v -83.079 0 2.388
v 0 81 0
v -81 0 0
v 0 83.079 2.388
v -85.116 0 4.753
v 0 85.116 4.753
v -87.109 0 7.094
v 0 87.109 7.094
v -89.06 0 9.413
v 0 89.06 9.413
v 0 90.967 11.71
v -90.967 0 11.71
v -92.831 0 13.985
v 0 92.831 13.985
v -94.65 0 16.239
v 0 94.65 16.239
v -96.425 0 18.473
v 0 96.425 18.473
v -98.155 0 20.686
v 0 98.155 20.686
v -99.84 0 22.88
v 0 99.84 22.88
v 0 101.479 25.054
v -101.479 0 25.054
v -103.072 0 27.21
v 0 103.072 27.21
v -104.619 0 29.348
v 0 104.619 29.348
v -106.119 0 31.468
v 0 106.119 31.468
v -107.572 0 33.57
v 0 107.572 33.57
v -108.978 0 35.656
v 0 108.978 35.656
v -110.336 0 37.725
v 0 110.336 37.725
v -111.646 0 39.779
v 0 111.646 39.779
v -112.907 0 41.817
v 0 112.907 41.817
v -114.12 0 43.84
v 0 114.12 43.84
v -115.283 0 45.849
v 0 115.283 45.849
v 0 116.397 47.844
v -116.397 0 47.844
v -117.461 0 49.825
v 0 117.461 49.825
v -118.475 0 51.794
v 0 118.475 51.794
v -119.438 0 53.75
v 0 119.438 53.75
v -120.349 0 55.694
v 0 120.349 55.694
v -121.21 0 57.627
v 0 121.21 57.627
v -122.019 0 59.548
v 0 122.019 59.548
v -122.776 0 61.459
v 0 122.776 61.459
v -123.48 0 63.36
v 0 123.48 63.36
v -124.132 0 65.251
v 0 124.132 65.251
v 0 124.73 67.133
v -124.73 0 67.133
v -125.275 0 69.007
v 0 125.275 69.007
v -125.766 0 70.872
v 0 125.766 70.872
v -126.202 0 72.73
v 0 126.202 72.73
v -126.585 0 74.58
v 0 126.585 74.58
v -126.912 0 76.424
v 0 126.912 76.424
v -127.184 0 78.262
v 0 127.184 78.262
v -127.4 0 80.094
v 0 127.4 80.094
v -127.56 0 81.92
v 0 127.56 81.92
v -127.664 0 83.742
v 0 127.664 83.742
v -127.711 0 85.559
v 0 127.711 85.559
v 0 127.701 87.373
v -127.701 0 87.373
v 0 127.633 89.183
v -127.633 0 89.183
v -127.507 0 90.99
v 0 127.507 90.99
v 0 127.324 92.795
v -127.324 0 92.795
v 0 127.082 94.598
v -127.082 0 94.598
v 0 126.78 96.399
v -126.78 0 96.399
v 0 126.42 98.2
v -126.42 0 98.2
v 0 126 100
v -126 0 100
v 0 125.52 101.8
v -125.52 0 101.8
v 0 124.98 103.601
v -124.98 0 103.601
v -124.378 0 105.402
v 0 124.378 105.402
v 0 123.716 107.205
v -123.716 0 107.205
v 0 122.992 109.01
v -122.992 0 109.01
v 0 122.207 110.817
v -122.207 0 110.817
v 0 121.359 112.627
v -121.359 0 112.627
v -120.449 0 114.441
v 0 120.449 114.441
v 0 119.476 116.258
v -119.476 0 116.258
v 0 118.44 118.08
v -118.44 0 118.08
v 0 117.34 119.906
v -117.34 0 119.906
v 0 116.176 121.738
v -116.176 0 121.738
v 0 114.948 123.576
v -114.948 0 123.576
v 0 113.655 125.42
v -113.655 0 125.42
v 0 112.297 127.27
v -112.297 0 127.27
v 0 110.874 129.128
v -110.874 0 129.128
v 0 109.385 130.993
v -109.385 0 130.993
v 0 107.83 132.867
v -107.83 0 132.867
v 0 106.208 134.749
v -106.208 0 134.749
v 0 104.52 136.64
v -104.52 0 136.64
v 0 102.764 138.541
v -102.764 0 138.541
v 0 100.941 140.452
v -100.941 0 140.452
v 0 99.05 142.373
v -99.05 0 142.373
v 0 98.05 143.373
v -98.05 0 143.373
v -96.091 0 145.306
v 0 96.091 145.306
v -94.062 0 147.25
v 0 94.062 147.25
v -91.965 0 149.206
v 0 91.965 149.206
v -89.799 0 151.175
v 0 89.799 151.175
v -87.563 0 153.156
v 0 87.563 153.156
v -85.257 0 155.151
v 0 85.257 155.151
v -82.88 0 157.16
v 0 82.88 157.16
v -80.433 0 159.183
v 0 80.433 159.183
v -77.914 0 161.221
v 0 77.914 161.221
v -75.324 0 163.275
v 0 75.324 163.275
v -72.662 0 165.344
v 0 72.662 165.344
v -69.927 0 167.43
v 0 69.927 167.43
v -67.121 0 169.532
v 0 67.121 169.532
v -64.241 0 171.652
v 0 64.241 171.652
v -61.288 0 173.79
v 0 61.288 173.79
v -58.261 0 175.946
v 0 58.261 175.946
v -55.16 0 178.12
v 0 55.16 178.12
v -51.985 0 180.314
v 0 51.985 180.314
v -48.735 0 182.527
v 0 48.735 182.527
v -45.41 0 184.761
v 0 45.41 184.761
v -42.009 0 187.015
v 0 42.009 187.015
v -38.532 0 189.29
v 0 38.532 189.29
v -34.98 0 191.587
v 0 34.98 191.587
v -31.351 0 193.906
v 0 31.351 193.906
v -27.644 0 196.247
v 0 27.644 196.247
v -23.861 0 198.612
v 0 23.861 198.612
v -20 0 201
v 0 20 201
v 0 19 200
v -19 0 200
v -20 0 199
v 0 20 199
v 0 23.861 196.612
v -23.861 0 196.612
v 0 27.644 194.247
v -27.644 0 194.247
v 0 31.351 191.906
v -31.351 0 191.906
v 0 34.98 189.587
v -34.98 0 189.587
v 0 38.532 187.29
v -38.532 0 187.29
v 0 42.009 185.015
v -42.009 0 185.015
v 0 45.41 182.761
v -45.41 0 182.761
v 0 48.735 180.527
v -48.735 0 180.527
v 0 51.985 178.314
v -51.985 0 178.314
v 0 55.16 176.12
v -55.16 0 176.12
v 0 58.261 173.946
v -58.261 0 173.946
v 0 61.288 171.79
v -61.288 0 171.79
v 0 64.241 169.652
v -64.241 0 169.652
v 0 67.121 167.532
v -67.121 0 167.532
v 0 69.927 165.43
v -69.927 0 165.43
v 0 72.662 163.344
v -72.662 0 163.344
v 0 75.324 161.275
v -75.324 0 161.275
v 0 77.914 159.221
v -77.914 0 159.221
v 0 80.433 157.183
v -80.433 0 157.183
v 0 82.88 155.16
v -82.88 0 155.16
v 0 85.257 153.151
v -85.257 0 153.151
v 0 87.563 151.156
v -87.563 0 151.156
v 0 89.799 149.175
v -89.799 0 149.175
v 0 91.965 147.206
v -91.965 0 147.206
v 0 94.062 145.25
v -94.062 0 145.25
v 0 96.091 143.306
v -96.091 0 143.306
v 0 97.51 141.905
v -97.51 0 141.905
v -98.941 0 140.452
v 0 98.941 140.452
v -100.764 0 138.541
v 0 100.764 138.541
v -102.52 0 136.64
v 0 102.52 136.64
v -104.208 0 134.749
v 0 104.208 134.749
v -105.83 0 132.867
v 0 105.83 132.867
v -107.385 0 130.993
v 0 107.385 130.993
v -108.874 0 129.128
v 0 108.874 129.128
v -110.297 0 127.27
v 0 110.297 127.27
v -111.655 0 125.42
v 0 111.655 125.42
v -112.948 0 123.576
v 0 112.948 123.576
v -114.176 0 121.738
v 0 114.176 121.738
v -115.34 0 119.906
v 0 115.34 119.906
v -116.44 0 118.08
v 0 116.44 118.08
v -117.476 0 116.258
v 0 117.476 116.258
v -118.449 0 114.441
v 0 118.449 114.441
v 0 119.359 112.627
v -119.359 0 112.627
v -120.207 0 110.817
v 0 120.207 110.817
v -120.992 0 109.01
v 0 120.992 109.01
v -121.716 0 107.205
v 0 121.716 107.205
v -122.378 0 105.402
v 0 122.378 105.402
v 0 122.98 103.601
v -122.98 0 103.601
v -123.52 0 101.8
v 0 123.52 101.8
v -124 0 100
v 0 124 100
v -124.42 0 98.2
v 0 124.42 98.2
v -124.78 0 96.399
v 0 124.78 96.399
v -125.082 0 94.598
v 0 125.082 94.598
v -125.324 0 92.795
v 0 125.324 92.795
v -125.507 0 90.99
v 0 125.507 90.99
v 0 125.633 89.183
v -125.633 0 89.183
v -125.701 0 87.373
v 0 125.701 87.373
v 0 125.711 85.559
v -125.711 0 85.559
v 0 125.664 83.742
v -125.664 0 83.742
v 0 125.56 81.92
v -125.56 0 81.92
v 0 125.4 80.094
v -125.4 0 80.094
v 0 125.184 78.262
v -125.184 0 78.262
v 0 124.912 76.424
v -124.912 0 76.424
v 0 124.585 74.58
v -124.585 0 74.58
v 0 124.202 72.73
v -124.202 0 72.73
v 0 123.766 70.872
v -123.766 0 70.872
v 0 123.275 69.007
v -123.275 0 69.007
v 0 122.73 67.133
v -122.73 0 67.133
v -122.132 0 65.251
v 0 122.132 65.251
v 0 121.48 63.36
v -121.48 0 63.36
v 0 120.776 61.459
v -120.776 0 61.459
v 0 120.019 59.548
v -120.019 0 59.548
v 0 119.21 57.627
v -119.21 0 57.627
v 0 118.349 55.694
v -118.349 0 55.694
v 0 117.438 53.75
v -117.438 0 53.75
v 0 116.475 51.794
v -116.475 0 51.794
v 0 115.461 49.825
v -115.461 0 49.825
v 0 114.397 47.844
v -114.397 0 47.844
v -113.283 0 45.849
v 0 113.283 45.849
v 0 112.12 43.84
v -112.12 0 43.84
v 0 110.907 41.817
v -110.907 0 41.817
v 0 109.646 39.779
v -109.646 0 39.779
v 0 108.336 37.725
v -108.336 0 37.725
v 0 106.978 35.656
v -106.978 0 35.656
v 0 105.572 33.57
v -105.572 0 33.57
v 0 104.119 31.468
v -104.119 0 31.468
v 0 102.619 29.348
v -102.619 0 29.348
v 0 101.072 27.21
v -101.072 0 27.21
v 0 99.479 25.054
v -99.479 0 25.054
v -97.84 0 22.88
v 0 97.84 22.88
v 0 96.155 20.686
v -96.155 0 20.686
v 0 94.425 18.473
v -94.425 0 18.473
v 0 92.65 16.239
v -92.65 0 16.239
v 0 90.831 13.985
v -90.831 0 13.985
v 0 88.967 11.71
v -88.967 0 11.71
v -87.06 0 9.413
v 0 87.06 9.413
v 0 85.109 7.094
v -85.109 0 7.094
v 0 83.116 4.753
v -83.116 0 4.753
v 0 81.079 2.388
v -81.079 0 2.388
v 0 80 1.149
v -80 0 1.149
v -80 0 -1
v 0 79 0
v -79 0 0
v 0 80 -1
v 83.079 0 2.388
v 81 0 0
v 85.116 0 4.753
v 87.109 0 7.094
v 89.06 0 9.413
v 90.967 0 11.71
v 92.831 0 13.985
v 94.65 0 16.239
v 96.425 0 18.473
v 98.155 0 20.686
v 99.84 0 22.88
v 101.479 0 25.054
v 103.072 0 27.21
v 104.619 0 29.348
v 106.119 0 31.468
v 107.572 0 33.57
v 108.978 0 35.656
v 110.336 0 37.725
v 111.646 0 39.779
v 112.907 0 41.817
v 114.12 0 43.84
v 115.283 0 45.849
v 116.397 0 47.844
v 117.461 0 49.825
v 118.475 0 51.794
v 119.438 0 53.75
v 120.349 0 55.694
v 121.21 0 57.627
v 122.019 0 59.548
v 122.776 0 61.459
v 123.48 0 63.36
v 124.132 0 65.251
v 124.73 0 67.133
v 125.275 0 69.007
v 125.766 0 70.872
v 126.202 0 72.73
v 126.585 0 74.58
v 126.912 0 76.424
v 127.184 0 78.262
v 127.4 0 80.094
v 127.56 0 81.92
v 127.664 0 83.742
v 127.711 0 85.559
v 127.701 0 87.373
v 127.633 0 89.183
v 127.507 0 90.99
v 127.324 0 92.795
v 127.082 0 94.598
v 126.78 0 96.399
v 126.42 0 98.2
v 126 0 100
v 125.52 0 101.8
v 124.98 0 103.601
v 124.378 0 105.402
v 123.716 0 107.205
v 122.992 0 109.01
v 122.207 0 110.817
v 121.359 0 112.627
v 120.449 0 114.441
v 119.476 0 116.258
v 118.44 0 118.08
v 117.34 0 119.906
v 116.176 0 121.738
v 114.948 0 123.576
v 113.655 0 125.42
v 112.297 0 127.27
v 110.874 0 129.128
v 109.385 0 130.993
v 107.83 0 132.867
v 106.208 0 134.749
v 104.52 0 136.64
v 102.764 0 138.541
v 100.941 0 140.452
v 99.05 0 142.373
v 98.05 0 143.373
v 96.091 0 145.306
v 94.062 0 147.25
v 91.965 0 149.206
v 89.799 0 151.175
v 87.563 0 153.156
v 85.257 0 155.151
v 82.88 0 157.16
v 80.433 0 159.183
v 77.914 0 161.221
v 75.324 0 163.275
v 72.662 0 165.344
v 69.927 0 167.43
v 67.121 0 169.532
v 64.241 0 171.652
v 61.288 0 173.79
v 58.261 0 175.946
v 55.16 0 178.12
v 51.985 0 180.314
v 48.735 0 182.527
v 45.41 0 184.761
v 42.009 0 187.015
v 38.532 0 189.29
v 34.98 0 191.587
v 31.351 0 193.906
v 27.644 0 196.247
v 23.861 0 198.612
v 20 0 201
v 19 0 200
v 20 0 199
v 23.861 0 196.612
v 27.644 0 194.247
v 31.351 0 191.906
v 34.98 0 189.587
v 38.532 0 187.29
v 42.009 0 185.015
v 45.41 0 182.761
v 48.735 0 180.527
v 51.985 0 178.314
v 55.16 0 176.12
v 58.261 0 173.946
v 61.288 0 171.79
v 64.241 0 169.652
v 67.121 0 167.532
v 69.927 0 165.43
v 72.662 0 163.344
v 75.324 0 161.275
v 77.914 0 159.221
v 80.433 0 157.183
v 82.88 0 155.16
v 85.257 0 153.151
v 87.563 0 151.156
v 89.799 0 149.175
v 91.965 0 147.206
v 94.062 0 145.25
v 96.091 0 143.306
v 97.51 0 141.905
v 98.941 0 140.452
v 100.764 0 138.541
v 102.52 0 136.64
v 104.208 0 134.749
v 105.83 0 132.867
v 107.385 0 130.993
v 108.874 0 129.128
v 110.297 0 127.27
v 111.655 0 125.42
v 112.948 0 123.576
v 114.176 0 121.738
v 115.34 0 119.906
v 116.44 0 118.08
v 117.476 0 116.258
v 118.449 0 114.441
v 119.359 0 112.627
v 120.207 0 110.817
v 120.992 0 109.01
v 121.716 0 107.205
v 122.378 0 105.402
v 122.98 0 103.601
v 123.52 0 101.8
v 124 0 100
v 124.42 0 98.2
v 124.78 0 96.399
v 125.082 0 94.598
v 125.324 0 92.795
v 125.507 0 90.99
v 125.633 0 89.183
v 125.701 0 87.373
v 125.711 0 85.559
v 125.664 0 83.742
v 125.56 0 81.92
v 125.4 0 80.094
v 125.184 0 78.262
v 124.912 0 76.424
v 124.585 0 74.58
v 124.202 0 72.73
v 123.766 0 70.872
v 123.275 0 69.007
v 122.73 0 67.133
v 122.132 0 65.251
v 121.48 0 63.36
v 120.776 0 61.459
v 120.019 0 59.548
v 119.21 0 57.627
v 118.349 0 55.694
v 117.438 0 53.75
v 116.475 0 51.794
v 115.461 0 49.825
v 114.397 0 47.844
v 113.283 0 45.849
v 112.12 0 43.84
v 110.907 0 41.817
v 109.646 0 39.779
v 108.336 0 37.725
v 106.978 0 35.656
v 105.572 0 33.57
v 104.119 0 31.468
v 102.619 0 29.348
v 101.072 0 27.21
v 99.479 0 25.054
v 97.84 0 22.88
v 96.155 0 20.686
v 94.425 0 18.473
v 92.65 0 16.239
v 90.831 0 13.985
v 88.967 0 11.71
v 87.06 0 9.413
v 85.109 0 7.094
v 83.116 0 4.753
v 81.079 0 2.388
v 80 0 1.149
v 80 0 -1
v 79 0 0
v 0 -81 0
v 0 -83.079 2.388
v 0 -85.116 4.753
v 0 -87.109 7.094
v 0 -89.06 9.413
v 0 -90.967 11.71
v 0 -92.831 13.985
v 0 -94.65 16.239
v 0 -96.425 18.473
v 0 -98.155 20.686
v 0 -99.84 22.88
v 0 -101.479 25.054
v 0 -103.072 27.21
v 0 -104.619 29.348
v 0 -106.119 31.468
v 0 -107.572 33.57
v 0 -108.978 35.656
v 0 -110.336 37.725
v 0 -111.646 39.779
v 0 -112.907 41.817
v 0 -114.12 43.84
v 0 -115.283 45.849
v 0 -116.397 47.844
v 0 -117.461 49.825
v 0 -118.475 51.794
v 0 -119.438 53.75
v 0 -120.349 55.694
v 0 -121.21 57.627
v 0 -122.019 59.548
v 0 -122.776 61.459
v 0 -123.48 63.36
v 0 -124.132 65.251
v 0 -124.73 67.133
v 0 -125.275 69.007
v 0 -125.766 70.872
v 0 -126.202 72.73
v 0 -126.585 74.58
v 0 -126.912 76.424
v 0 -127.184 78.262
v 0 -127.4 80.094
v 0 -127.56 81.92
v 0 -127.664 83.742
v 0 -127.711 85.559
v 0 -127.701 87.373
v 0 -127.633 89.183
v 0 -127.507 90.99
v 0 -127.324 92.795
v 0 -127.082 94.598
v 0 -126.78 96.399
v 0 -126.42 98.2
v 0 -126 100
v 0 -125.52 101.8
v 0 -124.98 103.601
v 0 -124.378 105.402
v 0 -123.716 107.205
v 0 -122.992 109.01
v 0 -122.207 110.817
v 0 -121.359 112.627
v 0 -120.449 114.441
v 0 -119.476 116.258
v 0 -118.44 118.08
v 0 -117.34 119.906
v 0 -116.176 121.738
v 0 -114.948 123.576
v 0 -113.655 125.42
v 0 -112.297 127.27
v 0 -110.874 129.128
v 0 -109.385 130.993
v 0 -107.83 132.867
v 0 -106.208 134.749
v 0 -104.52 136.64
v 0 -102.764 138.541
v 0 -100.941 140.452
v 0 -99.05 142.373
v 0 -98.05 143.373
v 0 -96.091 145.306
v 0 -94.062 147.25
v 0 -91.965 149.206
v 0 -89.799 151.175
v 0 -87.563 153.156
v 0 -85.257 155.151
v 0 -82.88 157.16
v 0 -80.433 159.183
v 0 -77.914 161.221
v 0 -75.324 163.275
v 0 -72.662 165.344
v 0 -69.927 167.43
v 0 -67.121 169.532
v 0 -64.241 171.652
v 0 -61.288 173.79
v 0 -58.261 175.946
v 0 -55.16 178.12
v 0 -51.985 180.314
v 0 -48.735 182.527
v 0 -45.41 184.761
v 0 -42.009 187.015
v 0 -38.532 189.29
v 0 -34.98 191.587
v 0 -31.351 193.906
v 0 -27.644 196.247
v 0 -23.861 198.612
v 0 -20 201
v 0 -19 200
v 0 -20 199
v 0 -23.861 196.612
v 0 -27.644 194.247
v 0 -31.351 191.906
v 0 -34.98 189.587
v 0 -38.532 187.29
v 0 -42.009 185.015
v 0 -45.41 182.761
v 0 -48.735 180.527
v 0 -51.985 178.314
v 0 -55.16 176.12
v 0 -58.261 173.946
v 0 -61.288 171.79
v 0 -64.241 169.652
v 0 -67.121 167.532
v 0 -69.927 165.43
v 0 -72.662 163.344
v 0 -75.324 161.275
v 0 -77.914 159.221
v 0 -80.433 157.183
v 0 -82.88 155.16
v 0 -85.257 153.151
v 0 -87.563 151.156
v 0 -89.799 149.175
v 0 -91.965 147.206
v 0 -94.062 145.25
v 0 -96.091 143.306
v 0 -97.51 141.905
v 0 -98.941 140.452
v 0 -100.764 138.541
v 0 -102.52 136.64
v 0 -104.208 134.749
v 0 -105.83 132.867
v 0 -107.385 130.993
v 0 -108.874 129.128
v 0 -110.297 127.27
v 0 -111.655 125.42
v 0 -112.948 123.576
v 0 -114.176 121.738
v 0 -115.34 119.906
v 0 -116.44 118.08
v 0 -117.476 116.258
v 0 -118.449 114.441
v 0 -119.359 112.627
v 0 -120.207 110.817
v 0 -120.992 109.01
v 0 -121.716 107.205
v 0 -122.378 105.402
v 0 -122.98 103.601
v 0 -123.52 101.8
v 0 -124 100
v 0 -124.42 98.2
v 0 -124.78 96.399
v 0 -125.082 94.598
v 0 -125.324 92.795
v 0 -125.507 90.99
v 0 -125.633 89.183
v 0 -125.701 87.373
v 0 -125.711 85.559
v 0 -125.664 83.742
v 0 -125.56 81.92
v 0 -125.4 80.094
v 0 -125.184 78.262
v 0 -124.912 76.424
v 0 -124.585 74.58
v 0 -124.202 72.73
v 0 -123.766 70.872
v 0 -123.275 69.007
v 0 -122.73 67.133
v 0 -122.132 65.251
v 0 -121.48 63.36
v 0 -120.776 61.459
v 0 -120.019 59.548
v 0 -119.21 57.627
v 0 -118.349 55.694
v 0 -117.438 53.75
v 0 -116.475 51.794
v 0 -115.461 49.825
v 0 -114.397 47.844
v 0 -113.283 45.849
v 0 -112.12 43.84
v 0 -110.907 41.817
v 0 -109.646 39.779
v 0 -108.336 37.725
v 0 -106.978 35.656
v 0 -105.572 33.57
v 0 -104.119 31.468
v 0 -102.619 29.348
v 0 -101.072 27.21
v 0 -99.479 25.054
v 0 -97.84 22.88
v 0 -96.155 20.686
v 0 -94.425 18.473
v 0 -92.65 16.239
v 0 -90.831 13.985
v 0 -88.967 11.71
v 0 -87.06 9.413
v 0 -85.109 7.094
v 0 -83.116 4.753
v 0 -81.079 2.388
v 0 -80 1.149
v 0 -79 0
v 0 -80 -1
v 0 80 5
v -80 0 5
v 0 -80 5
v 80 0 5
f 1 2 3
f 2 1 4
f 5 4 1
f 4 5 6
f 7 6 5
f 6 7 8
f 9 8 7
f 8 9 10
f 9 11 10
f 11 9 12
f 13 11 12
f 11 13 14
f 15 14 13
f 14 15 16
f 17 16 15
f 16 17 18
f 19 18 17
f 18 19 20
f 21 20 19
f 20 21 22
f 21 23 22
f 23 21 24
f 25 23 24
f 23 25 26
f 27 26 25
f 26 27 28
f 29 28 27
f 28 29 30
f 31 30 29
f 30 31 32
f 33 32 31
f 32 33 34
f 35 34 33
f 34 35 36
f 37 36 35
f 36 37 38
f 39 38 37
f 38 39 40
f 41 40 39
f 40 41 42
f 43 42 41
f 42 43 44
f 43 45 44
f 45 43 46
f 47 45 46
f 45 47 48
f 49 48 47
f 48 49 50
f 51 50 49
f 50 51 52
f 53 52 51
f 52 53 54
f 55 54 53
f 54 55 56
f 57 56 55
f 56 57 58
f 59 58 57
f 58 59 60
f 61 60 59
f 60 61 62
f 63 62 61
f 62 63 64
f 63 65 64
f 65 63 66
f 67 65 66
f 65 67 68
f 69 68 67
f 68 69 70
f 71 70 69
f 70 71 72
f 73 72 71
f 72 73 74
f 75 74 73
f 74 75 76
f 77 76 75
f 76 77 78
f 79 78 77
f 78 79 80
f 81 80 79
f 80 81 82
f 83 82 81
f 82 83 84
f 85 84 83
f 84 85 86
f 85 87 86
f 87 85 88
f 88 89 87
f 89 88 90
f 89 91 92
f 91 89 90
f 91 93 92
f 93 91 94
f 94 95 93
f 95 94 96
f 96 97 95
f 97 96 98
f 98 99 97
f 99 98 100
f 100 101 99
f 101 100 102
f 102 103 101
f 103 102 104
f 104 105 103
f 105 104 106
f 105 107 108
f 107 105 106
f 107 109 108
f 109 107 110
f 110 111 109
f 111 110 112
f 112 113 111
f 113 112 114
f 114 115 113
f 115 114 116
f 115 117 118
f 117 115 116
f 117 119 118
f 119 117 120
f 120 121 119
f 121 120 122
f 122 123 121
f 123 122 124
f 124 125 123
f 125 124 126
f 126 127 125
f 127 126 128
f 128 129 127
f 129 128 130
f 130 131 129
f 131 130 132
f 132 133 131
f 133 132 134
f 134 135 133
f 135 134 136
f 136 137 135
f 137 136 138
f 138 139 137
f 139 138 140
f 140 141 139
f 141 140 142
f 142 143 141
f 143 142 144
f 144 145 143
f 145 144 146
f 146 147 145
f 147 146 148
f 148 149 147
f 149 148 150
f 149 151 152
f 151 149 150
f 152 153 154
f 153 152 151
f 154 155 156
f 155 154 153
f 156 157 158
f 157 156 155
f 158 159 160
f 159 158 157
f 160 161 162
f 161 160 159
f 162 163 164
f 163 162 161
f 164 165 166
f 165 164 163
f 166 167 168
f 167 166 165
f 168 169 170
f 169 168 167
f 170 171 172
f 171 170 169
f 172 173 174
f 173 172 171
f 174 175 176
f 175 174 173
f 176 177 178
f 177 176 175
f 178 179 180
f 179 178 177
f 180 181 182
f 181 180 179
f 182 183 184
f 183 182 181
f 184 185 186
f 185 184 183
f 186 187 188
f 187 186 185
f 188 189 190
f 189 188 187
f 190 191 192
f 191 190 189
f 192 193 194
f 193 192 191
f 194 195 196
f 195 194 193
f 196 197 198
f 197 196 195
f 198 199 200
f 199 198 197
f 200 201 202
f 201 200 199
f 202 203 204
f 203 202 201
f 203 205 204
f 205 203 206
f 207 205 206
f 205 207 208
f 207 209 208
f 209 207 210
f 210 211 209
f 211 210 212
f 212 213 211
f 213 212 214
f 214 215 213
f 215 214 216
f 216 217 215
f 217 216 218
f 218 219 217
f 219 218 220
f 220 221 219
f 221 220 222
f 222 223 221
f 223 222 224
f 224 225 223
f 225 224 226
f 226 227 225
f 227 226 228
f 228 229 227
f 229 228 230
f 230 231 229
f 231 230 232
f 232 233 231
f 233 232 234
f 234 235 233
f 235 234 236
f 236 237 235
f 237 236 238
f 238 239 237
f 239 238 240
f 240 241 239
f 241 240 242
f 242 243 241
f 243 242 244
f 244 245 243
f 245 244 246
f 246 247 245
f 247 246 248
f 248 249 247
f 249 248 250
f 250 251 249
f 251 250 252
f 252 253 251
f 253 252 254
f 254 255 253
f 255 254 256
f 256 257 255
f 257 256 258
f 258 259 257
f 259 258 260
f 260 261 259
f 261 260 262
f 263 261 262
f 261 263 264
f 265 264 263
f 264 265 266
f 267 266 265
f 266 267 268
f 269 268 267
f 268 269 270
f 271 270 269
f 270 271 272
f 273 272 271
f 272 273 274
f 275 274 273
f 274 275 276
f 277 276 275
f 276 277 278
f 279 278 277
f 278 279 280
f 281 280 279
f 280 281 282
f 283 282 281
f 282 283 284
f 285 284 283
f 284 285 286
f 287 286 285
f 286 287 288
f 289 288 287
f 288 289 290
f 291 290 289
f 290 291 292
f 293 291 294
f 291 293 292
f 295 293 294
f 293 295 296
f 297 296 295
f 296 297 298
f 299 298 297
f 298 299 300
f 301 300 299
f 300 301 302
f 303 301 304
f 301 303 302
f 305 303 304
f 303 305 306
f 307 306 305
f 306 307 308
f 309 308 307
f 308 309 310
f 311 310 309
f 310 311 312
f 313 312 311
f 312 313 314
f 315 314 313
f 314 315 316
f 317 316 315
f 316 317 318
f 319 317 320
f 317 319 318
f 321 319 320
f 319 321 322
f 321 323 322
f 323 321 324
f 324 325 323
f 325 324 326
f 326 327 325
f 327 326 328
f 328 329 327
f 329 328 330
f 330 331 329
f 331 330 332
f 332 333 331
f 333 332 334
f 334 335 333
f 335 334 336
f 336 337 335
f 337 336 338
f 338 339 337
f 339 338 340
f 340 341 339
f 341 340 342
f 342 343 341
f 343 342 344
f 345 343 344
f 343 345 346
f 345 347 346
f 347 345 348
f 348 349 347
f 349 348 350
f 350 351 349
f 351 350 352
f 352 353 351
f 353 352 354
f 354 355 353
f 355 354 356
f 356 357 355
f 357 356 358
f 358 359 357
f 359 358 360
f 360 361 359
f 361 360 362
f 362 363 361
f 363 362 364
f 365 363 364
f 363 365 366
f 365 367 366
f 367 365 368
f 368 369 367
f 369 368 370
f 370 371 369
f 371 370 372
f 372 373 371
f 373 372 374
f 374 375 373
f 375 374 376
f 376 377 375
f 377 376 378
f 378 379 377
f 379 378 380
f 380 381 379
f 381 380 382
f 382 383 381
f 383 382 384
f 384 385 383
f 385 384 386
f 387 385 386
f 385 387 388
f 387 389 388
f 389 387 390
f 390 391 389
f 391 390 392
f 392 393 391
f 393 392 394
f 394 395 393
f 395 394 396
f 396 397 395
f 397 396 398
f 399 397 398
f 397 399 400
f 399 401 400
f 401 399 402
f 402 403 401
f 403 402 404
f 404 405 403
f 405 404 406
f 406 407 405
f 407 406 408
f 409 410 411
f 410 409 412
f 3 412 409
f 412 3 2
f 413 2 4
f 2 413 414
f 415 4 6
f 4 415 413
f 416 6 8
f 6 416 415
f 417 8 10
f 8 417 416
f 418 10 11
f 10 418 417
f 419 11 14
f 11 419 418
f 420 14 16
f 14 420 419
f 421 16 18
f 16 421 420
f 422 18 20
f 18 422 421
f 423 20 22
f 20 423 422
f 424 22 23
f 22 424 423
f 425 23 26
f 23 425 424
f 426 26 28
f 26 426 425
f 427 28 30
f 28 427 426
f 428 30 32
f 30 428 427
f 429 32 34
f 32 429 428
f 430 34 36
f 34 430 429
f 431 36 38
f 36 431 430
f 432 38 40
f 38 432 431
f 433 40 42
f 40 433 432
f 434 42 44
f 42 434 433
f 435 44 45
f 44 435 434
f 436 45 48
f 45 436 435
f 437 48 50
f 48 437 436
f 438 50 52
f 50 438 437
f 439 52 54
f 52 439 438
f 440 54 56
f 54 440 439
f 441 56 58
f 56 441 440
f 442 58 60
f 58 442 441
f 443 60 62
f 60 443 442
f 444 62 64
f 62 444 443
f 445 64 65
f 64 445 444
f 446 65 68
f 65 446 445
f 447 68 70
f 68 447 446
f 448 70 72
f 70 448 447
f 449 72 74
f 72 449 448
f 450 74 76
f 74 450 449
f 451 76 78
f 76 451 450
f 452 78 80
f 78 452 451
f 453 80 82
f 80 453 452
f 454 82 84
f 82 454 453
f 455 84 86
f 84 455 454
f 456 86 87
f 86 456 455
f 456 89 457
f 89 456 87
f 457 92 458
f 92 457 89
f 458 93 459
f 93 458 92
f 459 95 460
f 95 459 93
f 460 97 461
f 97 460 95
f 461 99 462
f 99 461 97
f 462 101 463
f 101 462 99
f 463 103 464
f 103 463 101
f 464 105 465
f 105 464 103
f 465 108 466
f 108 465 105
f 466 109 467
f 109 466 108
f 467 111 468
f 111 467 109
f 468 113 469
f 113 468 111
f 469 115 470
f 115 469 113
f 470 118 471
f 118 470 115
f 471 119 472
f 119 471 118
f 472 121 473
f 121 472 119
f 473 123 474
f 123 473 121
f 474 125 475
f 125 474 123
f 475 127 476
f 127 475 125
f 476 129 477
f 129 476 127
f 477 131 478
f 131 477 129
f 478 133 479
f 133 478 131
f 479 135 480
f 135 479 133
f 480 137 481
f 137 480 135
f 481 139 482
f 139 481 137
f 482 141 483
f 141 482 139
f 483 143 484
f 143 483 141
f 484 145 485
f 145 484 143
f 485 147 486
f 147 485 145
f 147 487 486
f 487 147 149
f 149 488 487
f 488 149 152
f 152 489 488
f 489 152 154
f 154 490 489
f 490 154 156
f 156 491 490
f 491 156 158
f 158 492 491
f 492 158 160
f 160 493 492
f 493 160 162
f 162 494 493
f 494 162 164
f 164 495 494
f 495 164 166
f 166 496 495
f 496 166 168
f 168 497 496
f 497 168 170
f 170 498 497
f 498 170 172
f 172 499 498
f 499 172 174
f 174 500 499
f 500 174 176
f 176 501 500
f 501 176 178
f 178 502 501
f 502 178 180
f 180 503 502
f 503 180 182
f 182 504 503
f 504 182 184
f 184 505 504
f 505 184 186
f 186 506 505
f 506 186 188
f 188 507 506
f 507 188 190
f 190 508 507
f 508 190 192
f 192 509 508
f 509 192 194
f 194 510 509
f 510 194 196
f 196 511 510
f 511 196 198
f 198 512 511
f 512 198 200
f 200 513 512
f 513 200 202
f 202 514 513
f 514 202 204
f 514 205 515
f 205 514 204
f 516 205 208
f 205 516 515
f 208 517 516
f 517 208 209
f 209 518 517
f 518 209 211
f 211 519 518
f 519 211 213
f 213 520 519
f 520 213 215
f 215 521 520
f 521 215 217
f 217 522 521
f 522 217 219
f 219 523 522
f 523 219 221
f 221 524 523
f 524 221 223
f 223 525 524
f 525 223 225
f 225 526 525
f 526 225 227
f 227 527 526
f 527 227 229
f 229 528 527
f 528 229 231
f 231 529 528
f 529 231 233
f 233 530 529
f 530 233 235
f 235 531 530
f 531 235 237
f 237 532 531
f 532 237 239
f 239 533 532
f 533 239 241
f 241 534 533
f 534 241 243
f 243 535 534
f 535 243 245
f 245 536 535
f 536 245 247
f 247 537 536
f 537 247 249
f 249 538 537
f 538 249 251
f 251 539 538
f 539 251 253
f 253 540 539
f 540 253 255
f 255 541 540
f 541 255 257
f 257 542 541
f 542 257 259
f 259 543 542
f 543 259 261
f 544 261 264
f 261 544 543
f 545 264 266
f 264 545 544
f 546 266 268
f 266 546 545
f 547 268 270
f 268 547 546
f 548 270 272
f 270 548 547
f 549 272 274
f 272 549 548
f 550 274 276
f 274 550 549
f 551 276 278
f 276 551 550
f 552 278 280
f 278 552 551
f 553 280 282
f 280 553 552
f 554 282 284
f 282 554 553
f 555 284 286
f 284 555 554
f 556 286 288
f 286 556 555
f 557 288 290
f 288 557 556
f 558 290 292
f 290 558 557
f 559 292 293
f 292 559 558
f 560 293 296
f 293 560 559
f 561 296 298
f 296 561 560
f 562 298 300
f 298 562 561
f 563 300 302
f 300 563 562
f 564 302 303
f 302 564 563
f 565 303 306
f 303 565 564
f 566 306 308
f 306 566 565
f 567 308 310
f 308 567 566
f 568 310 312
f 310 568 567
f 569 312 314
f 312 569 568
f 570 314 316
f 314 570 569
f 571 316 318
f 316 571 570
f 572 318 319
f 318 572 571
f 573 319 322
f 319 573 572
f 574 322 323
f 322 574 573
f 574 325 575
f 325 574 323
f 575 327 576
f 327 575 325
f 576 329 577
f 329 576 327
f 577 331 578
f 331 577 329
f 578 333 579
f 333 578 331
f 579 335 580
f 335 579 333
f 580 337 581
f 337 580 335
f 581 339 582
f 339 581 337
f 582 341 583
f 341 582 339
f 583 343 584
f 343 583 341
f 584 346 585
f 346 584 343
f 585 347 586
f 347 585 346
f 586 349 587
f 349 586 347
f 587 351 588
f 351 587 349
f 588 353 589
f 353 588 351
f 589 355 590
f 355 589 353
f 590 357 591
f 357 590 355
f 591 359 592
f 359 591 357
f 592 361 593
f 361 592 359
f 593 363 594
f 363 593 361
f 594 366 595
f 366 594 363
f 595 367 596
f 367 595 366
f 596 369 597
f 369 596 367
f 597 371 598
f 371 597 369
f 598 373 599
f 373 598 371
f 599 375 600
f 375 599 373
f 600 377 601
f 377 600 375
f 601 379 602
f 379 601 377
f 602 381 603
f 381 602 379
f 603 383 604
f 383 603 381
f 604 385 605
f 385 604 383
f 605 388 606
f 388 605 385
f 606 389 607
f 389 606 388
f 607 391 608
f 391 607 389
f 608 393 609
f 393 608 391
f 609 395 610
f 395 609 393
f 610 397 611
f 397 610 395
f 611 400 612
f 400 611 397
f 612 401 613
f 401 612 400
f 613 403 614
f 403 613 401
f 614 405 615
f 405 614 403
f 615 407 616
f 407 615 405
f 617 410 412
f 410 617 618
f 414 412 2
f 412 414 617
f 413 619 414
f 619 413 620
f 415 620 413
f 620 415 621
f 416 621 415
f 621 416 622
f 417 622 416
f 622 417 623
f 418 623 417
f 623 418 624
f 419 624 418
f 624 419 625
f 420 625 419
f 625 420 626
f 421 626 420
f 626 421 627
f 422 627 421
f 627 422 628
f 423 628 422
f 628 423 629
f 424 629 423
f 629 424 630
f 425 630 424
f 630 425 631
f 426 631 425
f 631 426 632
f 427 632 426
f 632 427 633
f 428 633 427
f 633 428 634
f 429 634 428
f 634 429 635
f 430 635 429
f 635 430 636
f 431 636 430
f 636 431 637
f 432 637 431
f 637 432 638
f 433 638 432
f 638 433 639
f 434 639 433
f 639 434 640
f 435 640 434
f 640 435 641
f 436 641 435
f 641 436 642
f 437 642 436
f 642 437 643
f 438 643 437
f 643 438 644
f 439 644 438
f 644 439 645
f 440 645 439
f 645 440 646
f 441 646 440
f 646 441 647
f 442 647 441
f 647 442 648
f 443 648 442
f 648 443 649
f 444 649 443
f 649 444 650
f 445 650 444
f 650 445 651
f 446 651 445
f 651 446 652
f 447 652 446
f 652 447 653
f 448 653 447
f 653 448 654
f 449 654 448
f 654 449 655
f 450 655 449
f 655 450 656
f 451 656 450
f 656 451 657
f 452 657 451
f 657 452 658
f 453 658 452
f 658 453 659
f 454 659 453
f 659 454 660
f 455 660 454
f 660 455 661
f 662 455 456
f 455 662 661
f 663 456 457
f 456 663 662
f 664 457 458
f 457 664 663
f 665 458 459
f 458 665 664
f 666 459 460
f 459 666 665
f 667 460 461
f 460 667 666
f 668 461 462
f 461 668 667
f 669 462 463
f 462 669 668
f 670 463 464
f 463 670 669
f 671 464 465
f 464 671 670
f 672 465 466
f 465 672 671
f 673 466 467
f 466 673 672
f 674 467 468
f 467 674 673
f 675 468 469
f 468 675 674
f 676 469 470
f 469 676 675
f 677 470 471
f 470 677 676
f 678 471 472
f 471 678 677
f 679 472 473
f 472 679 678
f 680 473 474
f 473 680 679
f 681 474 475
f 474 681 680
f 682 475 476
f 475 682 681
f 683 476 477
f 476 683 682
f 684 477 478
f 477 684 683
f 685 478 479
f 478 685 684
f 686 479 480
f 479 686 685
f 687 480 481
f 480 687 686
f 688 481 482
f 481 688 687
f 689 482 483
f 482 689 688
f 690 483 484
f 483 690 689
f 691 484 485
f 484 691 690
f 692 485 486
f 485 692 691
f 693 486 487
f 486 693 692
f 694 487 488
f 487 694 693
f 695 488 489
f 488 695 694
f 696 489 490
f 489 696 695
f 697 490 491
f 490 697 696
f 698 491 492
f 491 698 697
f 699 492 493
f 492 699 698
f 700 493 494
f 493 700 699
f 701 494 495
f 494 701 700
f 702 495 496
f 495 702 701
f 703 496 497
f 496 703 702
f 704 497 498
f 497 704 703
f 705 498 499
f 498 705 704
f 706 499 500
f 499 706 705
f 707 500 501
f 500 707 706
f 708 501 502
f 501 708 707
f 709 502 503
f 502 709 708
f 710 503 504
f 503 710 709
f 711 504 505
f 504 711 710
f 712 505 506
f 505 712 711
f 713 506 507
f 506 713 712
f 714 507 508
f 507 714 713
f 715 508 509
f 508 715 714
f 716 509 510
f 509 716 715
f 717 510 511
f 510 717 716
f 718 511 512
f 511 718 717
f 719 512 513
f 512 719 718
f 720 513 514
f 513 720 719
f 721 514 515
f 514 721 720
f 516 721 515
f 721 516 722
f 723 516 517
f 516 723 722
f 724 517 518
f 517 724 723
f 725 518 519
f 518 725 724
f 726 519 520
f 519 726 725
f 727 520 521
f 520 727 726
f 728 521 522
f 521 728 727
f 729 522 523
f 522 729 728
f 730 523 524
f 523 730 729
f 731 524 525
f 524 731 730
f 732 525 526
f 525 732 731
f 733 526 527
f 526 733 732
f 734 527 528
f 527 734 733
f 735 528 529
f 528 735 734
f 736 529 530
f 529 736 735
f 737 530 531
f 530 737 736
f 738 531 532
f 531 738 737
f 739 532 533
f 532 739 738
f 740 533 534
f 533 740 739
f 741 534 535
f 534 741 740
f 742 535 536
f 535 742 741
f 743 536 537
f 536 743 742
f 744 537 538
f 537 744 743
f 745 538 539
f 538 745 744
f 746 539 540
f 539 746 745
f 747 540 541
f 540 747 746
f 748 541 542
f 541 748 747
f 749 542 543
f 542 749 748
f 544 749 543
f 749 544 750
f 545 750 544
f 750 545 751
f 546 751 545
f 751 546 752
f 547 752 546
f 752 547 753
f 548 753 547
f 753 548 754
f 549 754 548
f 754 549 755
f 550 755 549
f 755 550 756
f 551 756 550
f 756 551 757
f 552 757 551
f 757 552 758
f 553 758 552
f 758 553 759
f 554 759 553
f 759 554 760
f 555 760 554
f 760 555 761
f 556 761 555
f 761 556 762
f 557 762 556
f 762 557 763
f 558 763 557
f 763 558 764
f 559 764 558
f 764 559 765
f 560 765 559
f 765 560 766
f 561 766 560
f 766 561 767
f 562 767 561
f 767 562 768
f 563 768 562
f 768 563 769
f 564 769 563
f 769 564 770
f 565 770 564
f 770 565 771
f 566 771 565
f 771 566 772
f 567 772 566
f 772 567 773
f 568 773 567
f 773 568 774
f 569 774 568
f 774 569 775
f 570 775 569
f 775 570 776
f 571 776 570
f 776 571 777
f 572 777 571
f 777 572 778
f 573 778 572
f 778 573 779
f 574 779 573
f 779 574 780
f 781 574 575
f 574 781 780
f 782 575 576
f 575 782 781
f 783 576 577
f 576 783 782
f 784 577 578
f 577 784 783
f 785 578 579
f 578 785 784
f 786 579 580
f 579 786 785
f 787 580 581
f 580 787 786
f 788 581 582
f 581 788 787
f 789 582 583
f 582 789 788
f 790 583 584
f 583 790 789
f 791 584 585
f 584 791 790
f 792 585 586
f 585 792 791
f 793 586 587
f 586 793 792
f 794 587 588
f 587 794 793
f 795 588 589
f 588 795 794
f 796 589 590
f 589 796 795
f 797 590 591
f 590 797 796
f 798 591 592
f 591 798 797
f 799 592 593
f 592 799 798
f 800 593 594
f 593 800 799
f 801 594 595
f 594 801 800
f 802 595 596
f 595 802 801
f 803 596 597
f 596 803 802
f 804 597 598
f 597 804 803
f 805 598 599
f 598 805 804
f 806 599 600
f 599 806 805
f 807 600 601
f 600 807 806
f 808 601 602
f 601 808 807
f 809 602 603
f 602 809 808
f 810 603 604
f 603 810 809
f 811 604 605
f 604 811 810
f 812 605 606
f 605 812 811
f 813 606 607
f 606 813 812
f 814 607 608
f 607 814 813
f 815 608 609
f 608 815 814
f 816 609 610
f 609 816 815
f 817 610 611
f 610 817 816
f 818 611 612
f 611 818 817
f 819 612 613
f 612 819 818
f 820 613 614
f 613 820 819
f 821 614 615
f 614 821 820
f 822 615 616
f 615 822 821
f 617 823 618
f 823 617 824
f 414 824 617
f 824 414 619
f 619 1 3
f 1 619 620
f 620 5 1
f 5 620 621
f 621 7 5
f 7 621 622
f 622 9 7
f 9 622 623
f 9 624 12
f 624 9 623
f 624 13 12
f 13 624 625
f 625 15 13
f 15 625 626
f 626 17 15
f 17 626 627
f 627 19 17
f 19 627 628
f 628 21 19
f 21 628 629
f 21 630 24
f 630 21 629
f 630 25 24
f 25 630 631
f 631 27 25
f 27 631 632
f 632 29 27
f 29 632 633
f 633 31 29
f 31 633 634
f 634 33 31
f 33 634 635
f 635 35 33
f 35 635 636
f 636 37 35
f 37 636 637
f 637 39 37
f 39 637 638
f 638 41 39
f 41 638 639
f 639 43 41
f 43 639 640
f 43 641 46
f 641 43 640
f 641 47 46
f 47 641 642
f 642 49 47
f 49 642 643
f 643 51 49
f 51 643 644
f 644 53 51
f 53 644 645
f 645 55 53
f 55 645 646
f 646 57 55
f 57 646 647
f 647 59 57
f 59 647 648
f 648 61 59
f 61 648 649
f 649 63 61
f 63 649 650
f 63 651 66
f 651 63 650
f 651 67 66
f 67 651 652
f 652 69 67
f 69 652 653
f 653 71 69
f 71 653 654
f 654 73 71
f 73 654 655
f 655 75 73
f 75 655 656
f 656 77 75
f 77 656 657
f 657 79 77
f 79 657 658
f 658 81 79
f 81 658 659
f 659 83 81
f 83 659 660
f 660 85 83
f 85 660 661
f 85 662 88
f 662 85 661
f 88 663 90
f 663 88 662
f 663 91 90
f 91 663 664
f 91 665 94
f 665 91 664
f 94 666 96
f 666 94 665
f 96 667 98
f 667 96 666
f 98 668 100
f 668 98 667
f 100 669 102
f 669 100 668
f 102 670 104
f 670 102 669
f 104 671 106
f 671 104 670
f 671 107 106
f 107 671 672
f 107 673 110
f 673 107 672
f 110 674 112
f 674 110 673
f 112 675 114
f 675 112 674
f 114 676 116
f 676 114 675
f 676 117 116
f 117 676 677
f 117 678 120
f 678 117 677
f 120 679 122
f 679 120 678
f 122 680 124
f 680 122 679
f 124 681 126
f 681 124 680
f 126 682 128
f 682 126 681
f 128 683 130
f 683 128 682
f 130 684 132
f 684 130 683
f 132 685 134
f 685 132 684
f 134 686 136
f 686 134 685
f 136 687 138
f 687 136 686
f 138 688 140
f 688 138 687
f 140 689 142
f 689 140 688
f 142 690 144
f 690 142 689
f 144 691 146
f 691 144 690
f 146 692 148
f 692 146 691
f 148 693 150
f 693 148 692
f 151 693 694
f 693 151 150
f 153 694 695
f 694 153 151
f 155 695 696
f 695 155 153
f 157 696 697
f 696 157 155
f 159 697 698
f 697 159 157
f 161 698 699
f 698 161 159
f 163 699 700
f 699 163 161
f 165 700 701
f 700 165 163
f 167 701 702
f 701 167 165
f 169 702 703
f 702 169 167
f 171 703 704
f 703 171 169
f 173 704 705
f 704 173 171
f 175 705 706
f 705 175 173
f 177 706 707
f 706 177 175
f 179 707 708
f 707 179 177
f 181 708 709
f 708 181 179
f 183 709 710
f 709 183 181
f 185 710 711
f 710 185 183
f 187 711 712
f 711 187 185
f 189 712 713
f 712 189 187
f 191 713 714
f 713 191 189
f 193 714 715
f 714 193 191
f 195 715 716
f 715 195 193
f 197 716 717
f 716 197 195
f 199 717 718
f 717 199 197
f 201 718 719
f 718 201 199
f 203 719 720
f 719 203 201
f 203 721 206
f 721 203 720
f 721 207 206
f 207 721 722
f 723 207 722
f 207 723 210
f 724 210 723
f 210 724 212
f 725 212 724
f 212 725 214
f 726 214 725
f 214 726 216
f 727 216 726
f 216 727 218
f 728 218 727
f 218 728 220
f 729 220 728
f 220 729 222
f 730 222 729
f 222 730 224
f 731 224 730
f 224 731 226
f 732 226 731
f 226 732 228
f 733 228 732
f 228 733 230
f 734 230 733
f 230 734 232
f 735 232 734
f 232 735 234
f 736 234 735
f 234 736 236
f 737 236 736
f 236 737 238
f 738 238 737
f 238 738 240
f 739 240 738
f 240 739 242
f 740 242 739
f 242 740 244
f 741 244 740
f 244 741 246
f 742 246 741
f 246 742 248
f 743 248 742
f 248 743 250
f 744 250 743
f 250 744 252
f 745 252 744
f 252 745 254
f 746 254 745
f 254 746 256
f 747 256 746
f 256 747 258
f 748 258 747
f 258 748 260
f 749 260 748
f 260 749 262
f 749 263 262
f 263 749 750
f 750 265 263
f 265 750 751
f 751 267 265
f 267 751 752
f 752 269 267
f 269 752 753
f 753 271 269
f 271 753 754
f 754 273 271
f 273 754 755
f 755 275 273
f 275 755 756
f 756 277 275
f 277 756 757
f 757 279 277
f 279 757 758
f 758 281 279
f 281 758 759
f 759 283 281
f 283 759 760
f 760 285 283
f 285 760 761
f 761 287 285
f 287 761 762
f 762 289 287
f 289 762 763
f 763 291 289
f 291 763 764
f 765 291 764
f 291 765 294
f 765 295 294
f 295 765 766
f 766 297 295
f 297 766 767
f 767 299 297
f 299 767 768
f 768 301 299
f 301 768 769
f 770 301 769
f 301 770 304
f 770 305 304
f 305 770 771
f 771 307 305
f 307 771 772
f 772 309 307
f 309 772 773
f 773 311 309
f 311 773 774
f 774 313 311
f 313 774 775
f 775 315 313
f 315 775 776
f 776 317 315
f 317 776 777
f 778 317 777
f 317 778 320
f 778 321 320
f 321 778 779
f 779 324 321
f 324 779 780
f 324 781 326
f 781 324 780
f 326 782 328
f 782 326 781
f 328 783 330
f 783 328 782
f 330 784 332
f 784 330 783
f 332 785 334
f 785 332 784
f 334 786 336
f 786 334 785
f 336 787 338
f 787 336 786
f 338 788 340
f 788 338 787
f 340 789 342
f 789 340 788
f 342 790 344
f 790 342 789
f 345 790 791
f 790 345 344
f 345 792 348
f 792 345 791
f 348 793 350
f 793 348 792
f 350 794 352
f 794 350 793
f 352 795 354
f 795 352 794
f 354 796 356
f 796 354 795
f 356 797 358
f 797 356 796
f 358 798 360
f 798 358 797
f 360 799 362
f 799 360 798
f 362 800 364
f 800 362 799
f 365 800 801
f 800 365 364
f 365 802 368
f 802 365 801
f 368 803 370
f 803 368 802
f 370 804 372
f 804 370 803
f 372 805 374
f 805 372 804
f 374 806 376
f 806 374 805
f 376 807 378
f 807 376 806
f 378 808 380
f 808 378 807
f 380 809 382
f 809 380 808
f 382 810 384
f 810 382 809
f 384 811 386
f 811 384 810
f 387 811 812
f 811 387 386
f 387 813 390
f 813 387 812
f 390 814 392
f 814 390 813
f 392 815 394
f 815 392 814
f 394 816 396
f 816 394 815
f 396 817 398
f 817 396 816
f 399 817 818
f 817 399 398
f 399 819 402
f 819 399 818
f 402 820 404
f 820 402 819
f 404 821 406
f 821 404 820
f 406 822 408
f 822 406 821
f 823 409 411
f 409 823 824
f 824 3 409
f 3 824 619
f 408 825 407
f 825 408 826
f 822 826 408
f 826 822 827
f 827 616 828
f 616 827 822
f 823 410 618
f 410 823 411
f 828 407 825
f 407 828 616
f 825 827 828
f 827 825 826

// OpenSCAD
/*[Coordinates]*/
point1x=80; 
point1z=0;
point2x=150;
point2z=80;
point3x=150;
point3z=120;
point4x=20;
point4z=200;
/*[Parameters]*/
Faces=4; 
wall_thickness=4;//[0.1:0.1:100]
bottom_thickness=5;
bottom_Z_offset=0;
bottom_rotation=360/Faces/2;
resolution=0.01; //[0.01:0.01:0.1]

show_origin_line=1;

$fn=Faces;

function curve_bezier_3(point1,point2,point3,point4)=
    [for(a=[0:resolution:1])
        point1*pow(1-a,3)+3*point2*a*pow(1-a,2)+3*point3*pow(a,2)*(1-a)+point4*pow(a,3)];

module line(point1,point2,width)
    {
        hull()
            {
            translate(point1)
                circle(d=width/2);
            translate(point2)
                circle(d=width/2);
            }
    }

module track(points,index,width)
{
    if(index<len(points))
        {
        line(points[index-1],points[index],width);
        track(points,index+1,width);
        }
}

point1=concat(point1x,point1z);
point2=concat(point2x,point2z);
point3=concat(point3x,point3z);
point4=concat(point4x,point4z);

points1=[point1,point2,point3,point4]; 

if(Faces%2==1)
{
rotate_extrude() track(curve_bezier_3(point1,point2,point3,point4),1,wall_thickness);
translate([0,0,bottom_Z_offset])
rotate([0,0,bottom_rotation])
cylinder(r=point1x,h=bottom_thickness);
echo(point1x);
}
else
{
rotate_extrude() track(curve_bezier_3(point1,point2,point3,point4),1,wall_thickness);
translate([0,0,bottom_Z_offset])
rotate([0,0,bottom_rotation*2])
cylinder(r=point1x,h=bottom_thickness);
}

if(show_origin_line==0)
rotate([90,0,0])
{
    line(point1,point2,wall_thickness);
line(point2,point3,wall_thickness);
line(point3,point4,wall_thickness);
track(curve_bezier_3(point1,point2,point3,point4),1,wall_thickness);
}
